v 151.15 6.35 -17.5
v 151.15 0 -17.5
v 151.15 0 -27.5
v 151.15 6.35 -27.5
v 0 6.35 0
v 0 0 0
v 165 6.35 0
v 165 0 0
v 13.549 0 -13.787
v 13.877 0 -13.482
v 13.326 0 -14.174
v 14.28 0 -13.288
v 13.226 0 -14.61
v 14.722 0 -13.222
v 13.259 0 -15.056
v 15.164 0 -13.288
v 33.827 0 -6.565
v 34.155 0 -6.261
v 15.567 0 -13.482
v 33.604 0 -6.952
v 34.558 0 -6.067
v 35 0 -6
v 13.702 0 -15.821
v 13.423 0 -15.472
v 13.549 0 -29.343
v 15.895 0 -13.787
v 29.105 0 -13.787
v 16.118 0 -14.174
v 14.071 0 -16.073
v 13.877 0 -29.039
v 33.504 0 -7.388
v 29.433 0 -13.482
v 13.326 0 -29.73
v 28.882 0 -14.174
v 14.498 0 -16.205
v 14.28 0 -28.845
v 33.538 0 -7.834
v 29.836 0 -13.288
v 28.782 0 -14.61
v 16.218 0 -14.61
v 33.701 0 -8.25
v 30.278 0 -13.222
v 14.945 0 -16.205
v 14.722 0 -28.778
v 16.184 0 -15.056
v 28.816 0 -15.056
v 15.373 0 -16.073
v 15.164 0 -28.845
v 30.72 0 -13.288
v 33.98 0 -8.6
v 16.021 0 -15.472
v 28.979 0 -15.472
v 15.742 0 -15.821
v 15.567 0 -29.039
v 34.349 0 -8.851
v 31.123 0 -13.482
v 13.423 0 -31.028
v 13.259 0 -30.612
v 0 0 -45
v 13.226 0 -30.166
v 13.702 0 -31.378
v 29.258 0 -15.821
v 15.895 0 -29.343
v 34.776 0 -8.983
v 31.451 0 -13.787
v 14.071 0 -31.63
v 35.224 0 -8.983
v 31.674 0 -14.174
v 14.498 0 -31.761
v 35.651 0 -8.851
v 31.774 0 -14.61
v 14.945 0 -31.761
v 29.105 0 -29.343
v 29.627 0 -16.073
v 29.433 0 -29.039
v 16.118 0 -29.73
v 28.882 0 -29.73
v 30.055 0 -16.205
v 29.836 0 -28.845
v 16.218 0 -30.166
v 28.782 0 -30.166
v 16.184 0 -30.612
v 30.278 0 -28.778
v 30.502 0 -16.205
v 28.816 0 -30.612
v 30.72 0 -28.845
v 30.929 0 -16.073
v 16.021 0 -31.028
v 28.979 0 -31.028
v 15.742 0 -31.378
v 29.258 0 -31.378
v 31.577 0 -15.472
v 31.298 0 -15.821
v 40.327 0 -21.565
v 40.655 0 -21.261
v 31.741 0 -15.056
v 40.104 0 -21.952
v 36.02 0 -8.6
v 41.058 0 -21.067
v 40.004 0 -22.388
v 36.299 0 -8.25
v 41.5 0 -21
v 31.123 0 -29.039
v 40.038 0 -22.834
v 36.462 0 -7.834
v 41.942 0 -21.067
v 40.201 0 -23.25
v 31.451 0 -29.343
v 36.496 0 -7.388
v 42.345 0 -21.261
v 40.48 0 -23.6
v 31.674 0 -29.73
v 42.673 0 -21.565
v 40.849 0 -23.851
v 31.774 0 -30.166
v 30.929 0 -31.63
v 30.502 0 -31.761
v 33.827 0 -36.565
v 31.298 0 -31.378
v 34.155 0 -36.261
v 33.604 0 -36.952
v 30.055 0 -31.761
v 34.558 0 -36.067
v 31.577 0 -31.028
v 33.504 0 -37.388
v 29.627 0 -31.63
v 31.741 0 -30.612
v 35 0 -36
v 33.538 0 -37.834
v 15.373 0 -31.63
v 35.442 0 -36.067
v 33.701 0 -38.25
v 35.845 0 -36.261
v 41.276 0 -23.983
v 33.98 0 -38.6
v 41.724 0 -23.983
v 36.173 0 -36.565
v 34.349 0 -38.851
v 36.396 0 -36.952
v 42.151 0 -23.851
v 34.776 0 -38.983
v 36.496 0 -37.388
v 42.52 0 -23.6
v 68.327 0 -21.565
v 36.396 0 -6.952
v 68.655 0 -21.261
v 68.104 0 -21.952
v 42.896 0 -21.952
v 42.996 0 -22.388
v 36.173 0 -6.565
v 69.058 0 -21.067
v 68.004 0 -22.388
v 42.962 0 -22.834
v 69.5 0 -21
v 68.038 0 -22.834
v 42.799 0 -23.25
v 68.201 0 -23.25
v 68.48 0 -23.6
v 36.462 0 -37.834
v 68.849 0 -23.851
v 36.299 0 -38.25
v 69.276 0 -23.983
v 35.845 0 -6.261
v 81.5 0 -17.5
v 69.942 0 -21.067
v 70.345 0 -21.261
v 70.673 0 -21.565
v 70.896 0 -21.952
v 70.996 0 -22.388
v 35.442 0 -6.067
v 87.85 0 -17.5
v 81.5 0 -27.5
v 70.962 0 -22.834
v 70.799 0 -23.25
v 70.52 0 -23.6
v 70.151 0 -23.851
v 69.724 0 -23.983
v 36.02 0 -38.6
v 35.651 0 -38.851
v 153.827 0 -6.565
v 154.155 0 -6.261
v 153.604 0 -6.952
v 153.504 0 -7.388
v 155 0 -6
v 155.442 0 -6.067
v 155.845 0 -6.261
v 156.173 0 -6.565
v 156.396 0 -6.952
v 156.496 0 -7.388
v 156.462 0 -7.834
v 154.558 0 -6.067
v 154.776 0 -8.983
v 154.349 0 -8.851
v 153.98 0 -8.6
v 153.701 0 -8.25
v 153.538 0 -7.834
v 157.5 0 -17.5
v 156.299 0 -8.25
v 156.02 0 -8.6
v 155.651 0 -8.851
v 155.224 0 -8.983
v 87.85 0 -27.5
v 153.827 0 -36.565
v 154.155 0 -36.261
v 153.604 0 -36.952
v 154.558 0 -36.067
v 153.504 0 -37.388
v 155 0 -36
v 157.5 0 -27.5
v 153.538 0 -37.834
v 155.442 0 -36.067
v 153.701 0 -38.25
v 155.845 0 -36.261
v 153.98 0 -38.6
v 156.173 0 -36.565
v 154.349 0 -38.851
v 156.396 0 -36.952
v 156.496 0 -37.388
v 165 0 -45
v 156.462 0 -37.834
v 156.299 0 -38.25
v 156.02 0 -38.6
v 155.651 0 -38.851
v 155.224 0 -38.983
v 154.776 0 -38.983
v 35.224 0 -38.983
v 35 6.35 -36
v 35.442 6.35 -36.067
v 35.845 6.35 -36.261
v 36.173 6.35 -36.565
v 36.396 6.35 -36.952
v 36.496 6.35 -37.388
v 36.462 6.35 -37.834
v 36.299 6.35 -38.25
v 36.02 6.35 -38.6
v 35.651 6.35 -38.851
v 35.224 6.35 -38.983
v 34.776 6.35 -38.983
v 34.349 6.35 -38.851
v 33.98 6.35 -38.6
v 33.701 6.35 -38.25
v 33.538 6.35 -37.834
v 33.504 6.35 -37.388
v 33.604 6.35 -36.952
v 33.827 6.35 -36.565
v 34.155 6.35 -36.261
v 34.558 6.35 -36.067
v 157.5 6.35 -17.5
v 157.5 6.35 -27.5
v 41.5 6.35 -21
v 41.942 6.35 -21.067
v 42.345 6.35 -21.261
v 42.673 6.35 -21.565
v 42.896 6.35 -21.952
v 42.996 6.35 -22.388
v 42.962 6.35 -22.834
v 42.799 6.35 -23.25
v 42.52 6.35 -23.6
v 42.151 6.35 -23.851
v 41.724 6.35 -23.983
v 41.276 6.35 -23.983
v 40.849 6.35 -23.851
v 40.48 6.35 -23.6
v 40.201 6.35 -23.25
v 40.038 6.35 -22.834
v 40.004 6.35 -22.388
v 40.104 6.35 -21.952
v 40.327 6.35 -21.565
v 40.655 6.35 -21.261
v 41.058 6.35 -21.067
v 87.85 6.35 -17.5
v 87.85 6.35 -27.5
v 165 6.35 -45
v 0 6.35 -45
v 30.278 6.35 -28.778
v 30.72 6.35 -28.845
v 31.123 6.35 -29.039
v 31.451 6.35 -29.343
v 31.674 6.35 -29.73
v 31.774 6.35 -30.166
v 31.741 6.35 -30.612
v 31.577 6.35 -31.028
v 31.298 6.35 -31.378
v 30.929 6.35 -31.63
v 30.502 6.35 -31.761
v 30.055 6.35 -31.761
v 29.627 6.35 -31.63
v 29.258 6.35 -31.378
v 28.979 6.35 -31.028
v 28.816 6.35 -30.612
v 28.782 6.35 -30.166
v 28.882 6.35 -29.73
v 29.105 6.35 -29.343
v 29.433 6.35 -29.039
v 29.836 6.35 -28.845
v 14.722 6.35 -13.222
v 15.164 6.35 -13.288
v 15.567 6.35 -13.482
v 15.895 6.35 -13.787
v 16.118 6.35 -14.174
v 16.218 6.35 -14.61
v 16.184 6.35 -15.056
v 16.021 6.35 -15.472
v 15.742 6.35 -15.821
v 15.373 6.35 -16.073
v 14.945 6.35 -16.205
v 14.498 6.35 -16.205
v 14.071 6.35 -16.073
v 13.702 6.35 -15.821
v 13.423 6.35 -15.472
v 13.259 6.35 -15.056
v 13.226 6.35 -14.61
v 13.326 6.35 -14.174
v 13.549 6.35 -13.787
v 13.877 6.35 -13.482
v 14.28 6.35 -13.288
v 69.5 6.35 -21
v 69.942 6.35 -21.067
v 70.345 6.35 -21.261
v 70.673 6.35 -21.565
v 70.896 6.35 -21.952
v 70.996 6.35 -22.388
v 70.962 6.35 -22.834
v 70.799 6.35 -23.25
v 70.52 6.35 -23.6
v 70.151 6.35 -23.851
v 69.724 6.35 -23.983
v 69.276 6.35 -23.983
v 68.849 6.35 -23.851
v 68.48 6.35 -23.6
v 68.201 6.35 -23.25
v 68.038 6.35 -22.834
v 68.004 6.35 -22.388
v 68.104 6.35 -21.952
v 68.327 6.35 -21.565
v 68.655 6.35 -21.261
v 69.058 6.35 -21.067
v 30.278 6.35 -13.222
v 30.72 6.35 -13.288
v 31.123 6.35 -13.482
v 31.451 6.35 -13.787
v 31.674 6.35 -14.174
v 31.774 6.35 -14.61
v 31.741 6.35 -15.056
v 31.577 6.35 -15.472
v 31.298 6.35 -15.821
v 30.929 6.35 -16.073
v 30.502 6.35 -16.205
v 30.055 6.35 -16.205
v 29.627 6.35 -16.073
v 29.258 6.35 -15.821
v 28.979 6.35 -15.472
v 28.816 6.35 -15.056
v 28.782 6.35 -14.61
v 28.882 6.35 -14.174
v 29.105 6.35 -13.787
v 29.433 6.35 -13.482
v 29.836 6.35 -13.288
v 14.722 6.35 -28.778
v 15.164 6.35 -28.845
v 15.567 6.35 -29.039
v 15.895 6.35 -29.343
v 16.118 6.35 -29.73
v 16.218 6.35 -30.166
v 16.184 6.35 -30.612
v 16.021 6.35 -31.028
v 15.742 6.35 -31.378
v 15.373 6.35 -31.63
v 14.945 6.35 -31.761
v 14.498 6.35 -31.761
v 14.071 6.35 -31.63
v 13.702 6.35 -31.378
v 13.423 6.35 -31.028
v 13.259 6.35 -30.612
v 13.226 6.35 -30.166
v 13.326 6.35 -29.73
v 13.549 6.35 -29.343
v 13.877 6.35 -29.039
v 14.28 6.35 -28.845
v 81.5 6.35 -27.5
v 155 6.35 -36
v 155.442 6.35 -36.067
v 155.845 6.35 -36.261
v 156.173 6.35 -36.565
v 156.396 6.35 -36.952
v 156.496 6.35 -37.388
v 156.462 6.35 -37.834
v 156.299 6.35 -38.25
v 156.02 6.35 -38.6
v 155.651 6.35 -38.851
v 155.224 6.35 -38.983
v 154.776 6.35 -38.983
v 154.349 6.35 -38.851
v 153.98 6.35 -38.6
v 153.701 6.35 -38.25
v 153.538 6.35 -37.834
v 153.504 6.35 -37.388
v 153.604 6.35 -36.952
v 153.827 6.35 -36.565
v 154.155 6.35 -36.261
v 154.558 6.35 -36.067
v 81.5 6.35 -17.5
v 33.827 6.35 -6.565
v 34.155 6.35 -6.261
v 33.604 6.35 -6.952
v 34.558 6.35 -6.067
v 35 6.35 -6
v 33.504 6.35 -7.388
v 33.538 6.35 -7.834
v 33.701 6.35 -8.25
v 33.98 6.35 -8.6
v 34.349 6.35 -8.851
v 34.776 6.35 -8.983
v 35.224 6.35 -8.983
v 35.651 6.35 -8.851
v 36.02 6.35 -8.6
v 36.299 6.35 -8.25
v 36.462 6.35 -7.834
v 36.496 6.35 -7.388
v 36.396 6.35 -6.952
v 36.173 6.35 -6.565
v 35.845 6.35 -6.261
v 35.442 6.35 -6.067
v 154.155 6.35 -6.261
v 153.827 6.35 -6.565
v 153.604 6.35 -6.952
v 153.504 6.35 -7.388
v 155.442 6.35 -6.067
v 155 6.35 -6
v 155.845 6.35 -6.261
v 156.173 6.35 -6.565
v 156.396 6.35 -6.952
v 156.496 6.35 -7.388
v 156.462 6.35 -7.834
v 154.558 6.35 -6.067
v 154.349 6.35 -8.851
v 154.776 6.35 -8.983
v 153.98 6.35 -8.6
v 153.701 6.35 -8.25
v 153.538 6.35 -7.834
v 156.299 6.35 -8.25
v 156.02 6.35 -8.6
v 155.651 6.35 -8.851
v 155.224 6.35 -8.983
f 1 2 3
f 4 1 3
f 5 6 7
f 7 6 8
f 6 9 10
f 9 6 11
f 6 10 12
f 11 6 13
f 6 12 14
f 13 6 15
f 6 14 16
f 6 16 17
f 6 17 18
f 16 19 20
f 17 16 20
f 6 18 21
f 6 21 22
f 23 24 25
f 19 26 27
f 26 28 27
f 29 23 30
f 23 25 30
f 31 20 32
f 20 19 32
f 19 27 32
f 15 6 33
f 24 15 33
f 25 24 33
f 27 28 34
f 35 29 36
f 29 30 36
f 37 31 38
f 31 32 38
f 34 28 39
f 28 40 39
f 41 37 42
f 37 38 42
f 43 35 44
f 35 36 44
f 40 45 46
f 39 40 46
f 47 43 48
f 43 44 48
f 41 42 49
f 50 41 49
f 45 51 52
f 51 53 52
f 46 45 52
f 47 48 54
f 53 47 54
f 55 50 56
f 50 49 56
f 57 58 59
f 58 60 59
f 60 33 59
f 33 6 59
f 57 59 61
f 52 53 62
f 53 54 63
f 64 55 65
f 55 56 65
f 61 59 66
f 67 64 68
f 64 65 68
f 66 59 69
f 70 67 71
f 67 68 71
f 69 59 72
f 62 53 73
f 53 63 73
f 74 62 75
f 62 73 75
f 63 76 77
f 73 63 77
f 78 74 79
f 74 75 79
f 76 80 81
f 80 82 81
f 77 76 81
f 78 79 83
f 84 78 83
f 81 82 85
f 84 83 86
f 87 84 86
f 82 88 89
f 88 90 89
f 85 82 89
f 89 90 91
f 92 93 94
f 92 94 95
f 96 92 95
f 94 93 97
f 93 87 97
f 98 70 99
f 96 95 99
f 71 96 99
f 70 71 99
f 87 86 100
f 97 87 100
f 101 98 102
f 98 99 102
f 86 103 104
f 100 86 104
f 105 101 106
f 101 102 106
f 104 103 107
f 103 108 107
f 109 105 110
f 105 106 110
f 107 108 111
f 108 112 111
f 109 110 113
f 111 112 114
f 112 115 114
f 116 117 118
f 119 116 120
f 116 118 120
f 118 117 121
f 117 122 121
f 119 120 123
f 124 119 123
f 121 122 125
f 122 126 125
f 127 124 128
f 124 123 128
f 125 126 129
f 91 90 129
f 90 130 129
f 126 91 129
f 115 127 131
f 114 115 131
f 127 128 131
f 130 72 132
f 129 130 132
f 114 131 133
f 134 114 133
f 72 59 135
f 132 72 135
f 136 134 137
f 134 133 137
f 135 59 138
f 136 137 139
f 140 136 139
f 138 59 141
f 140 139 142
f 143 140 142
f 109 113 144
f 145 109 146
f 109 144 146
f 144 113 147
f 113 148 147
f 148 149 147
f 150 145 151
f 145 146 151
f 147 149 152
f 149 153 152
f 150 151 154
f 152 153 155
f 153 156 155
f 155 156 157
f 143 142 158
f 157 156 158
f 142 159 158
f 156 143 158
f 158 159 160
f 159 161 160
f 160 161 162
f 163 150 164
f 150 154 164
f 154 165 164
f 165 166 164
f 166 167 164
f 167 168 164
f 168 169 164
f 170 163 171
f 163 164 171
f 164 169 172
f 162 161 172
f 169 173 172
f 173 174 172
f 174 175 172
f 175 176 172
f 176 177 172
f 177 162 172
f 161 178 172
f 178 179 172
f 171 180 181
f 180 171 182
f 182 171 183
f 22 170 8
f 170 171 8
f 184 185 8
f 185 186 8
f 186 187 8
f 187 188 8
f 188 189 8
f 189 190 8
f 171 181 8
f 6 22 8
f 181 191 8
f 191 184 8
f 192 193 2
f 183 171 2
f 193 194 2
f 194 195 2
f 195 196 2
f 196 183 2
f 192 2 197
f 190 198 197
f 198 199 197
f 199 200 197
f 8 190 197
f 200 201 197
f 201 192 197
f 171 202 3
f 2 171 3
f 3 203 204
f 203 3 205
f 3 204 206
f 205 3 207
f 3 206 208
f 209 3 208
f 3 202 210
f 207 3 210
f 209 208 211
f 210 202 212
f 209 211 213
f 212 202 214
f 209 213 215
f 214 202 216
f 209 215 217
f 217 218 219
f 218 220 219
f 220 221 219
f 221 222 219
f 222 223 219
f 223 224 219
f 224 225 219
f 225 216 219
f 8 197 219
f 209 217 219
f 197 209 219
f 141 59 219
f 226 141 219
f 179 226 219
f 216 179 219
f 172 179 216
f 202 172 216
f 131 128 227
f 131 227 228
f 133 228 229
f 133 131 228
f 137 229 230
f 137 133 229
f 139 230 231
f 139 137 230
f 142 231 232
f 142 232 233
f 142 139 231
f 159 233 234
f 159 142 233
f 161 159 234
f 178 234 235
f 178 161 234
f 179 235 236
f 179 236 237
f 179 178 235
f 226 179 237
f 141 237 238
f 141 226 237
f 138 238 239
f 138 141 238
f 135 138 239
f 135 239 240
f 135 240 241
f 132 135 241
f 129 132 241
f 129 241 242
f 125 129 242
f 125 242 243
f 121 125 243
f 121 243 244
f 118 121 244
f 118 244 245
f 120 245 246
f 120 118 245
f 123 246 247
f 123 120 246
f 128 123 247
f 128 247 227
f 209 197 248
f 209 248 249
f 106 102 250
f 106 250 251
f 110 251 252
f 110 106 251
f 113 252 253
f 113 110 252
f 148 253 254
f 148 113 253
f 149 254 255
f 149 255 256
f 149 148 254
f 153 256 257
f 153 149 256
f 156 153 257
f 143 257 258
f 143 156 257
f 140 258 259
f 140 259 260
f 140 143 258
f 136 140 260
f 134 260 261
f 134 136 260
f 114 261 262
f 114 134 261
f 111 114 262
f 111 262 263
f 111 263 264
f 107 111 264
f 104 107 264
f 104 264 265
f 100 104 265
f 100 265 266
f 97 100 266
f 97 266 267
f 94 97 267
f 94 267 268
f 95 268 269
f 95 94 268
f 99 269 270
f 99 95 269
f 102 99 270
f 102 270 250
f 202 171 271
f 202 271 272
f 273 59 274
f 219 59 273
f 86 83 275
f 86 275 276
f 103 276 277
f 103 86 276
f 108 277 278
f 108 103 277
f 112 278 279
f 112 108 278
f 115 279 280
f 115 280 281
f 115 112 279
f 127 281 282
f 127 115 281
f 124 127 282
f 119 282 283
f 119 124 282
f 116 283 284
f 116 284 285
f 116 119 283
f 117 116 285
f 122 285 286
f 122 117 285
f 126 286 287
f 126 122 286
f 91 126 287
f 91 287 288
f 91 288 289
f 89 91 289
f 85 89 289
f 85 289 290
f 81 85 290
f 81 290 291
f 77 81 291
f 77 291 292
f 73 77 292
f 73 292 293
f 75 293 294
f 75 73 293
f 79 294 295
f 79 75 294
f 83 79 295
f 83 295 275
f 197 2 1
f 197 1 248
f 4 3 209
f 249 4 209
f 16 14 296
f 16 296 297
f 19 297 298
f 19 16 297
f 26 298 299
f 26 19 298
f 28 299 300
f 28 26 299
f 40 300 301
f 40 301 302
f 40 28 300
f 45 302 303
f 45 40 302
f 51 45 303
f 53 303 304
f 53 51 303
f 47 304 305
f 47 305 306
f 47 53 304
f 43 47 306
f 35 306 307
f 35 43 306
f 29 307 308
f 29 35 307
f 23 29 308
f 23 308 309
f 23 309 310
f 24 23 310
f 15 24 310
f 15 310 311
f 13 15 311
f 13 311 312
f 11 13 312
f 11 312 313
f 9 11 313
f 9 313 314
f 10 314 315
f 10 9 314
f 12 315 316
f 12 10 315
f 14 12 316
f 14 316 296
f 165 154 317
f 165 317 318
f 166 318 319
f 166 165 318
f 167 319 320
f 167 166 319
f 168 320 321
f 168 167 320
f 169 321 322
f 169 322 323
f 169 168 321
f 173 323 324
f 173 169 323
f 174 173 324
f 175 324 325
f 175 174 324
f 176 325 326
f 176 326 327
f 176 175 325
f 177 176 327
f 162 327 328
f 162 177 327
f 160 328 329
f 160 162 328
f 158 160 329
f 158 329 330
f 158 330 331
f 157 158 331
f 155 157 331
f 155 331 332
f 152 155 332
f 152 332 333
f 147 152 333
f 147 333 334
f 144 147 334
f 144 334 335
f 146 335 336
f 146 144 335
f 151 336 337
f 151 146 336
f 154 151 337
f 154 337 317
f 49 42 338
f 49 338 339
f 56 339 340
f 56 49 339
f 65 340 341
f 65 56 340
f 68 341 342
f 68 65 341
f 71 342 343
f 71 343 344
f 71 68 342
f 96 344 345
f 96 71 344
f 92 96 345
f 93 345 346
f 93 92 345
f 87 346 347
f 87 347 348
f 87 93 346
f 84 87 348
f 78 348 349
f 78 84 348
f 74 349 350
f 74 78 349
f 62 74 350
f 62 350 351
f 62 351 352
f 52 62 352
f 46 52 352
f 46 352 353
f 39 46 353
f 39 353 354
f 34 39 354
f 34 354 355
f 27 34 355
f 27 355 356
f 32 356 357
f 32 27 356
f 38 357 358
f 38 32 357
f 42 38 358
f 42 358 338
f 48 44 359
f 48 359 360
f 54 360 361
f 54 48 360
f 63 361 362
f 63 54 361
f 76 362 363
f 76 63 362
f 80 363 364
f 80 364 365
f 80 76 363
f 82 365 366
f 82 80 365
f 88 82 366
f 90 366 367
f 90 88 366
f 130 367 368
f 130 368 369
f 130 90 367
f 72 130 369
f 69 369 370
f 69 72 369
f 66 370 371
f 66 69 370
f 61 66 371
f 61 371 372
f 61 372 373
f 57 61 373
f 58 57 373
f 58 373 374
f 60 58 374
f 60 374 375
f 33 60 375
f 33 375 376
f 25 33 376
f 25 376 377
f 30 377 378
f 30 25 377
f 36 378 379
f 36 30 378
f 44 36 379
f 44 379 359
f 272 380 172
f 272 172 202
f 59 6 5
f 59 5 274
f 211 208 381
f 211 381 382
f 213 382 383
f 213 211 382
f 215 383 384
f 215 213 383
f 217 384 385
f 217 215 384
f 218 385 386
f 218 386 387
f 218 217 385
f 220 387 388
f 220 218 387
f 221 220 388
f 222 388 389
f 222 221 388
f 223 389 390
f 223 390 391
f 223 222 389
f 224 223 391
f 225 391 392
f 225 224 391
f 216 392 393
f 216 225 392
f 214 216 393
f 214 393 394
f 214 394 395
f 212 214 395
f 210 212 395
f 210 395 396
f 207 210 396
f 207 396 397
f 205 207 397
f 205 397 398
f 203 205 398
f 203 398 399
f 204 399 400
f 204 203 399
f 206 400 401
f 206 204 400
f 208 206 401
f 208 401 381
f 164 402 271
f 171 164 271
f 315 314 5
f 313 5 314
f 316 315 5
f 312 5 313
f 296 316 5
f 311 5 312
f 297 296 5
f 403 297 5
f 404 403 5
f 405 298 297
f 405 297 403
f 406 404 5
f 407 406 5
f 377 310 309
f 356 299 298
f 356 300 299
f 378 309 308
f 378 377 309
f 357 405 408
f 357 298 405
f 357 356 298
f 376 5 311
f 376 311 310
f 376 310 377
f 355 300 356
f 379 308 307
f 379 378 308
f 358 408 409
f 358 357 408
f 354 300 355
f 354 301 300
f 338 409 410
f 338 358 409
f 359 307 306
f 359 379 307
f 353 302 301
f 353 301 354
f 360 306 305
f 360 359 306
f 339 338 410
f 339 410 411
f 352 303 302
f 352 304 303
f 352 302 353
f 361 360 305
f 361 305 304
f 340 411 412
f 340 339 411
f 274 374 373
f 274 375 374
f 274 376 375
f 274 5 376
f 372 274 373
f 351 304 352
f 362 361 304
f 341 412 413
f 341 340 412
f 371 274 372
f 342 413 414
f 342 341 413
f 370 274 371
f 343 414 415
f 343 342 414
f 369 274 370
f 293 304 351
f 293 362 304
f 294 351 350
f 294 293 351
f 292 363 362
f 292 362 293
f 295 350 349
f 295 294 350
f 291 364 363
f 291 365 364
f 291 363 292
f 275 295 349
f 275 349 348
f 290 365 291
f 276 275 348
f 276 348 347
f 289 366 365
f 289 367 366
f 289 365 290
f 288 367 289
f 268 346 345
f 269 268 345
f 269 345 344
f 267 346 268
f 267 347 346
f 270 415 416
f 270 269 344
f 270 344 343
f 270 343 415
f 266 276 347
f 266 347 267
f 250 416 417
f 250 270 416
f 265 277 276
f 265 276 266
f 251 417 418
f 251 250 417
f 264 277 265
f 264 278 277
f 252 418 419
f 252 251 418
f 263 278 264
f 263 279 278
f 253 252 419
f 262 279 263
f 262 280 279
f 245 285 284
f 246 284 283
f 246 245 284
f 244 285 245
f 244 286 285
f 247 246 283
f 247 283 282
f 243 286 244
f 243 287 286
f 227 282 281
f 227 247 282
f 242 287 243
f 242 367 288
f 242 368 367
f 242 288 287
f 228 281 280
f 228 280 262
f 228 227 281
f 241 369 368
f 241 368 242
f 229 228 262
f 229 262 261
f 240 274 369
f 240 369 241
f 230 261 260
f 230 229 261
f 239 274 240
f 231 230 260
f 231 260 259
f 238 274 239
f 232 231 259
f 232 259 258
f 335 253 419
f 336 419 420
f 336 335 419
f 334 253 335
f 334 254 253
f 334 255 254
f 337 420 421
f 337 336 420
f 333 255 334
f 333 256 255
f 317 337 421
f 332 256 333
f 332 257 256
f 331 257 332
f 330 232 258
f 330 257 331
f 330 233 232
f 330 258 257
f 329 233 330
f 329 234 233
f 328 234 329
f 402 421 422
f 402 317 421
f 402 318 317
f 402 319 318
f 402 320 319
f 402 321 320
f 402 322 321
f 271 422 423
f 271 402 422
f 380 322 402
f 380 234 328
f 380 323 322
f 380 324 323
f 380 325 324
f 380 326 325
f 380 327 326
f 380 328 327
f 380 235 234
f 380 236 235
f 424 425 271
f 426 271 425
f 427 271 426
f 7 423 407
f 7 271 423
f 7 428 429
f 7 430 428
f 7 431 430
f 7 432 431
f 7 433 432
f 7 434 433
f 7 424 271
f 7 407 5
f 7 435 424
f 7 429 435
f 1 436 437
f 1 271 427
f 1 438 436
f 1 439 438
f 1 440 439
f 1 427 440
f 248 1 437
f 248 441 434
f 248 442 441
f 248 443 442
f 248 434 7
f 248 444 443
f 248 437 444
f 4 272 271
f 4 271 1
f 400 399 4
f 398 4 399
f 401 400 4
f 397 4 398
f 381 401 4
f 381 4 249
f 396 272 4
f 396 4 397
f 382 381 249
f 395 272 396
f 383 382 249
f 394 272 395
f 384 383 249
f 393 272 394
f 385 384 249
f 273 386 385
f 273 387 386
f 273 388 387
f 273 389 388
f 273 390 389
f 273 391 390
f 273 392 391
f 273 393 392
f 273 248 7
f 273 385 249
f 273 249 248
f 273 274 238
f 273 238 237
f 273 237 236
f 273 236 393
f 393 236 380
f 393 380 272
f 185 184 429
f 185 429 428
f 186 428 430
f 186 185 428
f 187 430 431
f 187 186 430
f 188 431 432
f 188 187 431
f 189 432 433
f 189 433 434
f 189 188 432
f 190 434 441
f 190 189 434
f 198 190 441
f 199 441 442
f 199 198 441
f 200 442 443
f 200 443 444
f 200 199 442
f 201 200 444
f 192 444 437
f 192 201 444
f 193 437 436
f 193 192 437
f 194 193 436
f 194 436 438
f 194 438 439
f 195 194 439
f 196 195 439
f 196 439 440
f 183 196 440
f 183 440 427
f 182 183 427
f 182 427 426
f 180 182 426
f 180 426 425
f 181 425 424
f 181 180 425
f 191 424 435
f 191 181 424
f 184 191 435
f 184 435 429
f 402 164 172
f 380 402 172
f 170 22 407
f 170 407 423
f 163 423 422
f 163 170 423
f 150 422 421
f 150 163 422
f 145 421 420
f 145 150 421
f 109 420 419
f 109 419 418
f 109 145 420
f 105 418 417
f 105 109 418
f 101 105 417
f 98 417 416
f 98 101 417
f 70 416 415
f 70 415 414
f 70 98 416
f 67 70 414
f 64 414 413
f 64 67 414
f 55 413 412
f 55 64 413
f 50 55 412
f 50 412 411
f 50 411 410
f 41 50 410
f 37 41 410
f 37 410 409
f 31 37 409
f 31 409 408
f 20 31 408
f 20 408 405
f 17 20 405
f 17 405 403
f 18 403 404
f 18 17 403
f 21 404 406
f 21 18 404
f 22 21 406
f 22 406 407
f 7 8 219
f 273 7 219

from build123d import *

# Parameters (mm, degrees)
SKETCH1_W           = 165
SKETCH1_H           = 45
SKETCH1_R           = 1.5
SKETCH1_W_2         = 6.35
SKETCH1_H_2         = 10
BOSS_EXTRUDE1_DEPTH = 6.35


with BuildPart() as part:
    # Sketch1 → Boss-Extrude1 (new body)
    with BuildSketch(Plane(origin=(0, 0, 0), x_dir=(1, 0, 0), z_dir=(0, 1, 0))):
        with Locations((82.5, 22.5)):
            Rectangle(SKETCH1_W, SKETCH1_H)
        with Locations(Location((14.721825407, 30.278174593, 0), (0, 0, 270))):
            Circle(SKETCH1_R, mode=Mode.SUBTRACT)
        with Locations(Location((14.721825407, 14.721825407, 0), (0, 0, 270))):
            Circle(SKETCH1_R, mode=Mode.SUBTRACT)
        with Locations(Location((30.278174593, 30.278174593, 0), (0, 0, 270))):
            Circle(SKETCH1_R, mode=Mode.SUBTRACT)
        with Locations(Location((30.278174593, 14.721825407, 0), (0, 0, 270))):
            Circle(SKETCH1_R, mode=Mode.SUBTRACT)
        with Locations(Location((41.5, 22.5, 0), (0, 0, 270))):
            Circle(SKETCH1_R, mode=Mode.SUBTRACT)
        with Locations(Location((69.5, 22.5, 0), (0, 0, 270))):
            Circle(SKETCH1_R, mode=Mode.SUBTRACT)
        with Locations(Location((155, 7.5, 0), (0, 0, 270))):
            Circle(SKETCH1_R, mode=Mode.SUBTRACT)
        with Locations(Location((155, 37.5, 0), (0, 0, 270))):
            Circle(SKETCH1_R, mode=Mode.SUBTRACT)
        with Locations(Location((35, 37.5, 0), (0, 0, 270))):
            Circle(SKETCH1_R, mode=Mode.SUBTRACT)
        with Locations(Location((35, 7.5, 0), (0, 0, 270))):
            Circle(SKETCH1_R, mode=Mode.SUBTRACT)
        with Locations((84.675, 22.5)):
            Rectangle(SKETCH1_W_2, SKETCH1_H_2, mode=Mode.SUBTRACT)
        with Locations((154.325, 22.5)):
            Rectangle(SKETCH1_W_2, SKETCH1_H_2, mode=Mode.SUBTRACT)
    extrude(amount=BOSS_EXTRUDE1_DEPTH)


solid = part.part
